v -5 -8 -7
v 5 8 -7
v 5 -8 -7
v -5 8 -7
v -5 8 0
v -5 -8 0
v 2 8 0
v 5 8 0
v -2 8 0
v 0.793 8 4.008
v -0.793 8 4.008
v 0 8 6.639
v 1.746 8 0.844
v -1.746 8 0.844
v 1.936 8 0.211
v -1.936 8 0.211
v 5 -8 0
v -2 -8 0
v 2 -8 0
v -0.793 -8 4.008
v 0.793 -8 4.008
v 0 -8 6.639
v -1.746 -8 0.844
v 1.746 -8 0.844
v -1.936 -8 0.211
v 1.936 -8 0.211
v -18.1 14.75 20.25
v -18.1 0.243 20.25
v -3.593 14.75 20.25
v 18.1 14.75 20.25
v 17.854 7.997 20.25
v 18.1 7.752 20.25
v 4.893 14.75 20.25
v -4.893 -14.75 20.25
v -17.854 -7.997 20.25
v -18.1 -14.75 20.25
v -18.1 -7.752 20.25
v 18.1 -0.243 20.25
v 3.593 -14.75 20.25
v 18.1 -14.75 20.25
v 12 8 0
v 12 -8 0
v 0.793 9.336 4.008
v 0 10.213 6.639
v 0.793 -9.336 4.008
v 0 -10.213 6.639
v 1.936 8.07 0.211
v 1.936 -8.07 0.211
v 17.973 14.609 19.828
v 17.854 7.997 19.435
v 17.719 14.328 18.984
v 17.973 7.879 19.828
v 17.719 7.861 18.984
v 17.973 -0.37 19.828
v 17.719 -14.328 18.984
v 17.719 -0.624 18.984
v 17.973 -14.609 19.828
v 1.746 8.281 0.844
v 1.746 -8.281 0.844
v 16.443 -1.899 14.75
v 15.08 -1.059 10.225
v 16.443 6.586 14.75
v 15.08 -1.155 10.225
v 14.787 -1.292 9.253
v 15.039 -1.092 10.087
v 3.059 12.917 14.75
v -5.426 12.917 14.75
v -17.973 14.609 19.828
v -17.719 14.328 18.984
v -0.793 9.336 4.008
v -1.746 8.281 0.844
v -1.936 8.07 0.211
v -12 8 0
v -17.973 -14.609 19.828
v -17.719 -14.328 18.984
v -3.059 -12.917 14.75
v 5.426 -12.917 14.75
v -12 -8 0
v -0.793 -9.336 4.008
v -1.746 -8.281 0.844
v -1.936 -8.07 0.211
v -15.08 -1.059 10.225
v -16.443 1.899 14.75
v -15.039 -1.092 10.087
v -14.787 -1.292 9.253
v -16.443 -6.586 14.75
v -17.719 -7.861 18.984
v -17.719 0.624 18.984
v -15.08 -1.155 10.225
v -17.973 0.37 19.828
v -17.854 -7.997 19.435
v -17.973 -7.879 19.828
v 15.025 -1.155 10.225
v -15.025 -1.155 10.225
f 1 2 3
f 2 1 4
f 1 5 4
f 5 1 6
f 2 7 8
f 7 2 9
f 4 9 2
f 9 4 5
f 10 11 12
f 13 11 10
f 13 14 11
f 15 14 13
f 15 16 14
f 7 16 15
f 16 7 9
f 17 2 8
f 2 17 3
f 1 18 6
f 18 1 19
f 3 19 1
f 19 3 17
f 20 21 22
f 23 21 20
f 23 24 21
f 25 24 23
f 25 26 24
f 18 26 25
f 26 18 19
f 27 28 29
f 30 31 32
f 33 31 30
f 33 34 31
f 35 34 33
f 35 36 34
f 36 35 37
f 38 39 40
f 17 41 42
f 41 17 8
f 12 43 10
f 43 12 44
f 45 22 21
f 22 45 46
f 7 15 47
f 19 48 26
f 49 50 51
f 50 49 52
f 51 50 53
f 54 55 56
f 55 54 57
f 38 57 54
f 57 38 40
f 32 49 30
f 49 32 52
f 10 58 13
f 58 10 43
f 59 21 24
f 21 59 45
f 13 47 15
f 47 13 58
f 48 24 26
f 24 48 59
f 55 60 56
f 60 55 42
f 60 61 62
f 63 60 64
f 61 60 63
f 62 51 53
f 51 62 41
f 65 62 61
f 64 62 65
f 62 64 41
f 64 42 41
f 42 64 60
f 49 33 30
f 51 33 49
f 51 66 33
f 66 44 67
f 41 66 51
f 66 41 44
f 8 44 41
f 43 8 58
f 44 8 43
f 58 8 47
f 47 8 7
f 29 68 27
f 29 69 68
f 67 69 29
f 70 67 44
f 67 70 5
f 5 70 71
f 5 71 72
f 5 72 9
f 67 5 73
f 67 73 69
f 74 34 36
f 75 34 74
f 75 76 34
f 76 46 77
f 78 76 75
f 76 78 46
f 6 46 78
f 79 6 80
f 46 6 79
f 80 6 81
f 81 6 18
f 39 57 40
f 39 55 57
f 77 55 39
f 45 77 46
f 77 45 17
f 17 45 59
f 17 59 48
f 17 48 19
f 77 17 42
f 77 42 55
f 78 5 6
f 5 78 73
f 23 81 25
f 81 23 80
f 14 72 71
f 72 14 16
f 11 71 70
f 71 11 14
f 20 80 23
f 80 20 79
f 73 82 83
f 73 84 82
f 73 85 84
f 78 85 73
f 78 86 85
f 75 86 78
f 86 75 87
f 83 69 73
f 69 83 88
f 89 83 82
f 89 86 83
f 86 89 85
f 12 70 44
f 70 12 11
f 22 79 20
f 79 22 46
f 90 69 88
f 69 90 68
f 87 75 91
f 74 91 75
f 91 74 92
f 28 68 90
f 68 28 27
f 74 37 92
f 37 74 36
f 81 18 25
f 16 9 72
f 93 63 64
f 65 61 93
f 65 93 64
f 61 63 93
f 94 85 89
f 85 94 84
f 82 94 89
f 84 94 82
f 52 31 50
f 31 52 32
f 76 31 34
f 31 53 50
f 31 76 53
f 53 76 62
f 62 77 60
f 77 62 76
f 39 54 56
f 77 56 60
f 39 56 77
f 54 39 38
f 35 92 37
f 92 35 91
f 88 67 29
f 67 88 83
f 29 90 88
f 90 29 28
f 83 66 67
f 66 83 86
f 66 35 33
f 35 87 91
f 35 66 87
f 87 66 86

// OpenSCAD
$fn=96;

L = 54.5;
W = 22.2;
H = 29.5;

center_len = 14.0;
end_len = (L - center_len)/2;

arm_w_end = W;
arm_w_center = 10.0;

arm_h_end = H;
arm_h_center = 16.0;

tri_aperture_end = 14.0;   // side length of triangular opening at each end face
tri_aperture_center = 4.0; // side length near center
tri_depth = end_len + 0.2; // slightly beyond to ensure clean cut

module tri_prism_x(len, side){
    htri = side*sqrt(3)/2;
    rotate([0,90,0])
        linear_extrude(height=len, center=true, convexity=10)
            polygon(points=[
                [-side/2, -htri/3],
                [ side/2, -htri/3],
                [ 0,      2*htri/3]
            ]);
}

module half_body(sign=1){
    // sign=1 for +X half, sign=-1 for -X half
    translate([sign*(center_len/2),0,0])
        linear_extrude(height=end_len, center=false, convexity=10, scale=[arm_w_end/arm_w_center, arm_h_end/arm_h_center])
            square([arm_w_center, arm_h_center], center=true);
}

module body(){
    union(){
        // central block
        linear_extrude(height=center_len, center=true, convexity=10)
            square([arm_w_center, arm_h_center], center=true);

        // flared arms
        half_body(1);
        mirror([1,0,0]) half_body(1);
    }
}

module triangular_voids(){
    // +X end void tapering toward center
    translate([L/2 - tri_depth/2, 0, 0])
        linear_extrude(height=tri_depth, center=true, convexity=10, scale=tri_aperture_center/tri_aperture_end)
            polygon(points=[
                [-tri_aperture_end/2, -(tri_aperture_end*sqrt(3)/2)/3],
                [ tri_aperture_end/2, -(tri_aperture_end*sqrt(3)/2)/3],
                [ 0,                   2*(tri_aperture_end*sqrt(3)/2)/3]
            ]);

    // -X end void tapering toward center
    mirror([1,0,0])
        translate([L/2 - tri_depth/2, 0, 0])
            linear_extrude(height=tri_depth, center=true, convexity=10, scale=tri_aperture_center/tri_aperture_end)
                polygon(points=[
                    [-tri_aperture_end/2, -(tri_aperture_end*sqrt(3)/2)/3],
                    [ tri_aperture_end/2, -(tri_aperture_end*sqrt(3)/2)/3],
                    [ 0,                   2*(tri_aperture_end*sqrt(3)/2)/3]
                ]);
}

module edge_chamfers(){
    // Create large angled faces by subtracting four long wedges around the body
    cham = 6.0;
    for (sy=[-1,1], sz=[-1,1]){
        translate([0, sy*(W/2 + cham/2), sz*(H/2 + cham/2)])
            rotate([0,0,45])
                cube([L+2, cham, cham], center=true);
    }
}

difference(){
    body();
    triangular_voids();
    edge_chamfers();
}
